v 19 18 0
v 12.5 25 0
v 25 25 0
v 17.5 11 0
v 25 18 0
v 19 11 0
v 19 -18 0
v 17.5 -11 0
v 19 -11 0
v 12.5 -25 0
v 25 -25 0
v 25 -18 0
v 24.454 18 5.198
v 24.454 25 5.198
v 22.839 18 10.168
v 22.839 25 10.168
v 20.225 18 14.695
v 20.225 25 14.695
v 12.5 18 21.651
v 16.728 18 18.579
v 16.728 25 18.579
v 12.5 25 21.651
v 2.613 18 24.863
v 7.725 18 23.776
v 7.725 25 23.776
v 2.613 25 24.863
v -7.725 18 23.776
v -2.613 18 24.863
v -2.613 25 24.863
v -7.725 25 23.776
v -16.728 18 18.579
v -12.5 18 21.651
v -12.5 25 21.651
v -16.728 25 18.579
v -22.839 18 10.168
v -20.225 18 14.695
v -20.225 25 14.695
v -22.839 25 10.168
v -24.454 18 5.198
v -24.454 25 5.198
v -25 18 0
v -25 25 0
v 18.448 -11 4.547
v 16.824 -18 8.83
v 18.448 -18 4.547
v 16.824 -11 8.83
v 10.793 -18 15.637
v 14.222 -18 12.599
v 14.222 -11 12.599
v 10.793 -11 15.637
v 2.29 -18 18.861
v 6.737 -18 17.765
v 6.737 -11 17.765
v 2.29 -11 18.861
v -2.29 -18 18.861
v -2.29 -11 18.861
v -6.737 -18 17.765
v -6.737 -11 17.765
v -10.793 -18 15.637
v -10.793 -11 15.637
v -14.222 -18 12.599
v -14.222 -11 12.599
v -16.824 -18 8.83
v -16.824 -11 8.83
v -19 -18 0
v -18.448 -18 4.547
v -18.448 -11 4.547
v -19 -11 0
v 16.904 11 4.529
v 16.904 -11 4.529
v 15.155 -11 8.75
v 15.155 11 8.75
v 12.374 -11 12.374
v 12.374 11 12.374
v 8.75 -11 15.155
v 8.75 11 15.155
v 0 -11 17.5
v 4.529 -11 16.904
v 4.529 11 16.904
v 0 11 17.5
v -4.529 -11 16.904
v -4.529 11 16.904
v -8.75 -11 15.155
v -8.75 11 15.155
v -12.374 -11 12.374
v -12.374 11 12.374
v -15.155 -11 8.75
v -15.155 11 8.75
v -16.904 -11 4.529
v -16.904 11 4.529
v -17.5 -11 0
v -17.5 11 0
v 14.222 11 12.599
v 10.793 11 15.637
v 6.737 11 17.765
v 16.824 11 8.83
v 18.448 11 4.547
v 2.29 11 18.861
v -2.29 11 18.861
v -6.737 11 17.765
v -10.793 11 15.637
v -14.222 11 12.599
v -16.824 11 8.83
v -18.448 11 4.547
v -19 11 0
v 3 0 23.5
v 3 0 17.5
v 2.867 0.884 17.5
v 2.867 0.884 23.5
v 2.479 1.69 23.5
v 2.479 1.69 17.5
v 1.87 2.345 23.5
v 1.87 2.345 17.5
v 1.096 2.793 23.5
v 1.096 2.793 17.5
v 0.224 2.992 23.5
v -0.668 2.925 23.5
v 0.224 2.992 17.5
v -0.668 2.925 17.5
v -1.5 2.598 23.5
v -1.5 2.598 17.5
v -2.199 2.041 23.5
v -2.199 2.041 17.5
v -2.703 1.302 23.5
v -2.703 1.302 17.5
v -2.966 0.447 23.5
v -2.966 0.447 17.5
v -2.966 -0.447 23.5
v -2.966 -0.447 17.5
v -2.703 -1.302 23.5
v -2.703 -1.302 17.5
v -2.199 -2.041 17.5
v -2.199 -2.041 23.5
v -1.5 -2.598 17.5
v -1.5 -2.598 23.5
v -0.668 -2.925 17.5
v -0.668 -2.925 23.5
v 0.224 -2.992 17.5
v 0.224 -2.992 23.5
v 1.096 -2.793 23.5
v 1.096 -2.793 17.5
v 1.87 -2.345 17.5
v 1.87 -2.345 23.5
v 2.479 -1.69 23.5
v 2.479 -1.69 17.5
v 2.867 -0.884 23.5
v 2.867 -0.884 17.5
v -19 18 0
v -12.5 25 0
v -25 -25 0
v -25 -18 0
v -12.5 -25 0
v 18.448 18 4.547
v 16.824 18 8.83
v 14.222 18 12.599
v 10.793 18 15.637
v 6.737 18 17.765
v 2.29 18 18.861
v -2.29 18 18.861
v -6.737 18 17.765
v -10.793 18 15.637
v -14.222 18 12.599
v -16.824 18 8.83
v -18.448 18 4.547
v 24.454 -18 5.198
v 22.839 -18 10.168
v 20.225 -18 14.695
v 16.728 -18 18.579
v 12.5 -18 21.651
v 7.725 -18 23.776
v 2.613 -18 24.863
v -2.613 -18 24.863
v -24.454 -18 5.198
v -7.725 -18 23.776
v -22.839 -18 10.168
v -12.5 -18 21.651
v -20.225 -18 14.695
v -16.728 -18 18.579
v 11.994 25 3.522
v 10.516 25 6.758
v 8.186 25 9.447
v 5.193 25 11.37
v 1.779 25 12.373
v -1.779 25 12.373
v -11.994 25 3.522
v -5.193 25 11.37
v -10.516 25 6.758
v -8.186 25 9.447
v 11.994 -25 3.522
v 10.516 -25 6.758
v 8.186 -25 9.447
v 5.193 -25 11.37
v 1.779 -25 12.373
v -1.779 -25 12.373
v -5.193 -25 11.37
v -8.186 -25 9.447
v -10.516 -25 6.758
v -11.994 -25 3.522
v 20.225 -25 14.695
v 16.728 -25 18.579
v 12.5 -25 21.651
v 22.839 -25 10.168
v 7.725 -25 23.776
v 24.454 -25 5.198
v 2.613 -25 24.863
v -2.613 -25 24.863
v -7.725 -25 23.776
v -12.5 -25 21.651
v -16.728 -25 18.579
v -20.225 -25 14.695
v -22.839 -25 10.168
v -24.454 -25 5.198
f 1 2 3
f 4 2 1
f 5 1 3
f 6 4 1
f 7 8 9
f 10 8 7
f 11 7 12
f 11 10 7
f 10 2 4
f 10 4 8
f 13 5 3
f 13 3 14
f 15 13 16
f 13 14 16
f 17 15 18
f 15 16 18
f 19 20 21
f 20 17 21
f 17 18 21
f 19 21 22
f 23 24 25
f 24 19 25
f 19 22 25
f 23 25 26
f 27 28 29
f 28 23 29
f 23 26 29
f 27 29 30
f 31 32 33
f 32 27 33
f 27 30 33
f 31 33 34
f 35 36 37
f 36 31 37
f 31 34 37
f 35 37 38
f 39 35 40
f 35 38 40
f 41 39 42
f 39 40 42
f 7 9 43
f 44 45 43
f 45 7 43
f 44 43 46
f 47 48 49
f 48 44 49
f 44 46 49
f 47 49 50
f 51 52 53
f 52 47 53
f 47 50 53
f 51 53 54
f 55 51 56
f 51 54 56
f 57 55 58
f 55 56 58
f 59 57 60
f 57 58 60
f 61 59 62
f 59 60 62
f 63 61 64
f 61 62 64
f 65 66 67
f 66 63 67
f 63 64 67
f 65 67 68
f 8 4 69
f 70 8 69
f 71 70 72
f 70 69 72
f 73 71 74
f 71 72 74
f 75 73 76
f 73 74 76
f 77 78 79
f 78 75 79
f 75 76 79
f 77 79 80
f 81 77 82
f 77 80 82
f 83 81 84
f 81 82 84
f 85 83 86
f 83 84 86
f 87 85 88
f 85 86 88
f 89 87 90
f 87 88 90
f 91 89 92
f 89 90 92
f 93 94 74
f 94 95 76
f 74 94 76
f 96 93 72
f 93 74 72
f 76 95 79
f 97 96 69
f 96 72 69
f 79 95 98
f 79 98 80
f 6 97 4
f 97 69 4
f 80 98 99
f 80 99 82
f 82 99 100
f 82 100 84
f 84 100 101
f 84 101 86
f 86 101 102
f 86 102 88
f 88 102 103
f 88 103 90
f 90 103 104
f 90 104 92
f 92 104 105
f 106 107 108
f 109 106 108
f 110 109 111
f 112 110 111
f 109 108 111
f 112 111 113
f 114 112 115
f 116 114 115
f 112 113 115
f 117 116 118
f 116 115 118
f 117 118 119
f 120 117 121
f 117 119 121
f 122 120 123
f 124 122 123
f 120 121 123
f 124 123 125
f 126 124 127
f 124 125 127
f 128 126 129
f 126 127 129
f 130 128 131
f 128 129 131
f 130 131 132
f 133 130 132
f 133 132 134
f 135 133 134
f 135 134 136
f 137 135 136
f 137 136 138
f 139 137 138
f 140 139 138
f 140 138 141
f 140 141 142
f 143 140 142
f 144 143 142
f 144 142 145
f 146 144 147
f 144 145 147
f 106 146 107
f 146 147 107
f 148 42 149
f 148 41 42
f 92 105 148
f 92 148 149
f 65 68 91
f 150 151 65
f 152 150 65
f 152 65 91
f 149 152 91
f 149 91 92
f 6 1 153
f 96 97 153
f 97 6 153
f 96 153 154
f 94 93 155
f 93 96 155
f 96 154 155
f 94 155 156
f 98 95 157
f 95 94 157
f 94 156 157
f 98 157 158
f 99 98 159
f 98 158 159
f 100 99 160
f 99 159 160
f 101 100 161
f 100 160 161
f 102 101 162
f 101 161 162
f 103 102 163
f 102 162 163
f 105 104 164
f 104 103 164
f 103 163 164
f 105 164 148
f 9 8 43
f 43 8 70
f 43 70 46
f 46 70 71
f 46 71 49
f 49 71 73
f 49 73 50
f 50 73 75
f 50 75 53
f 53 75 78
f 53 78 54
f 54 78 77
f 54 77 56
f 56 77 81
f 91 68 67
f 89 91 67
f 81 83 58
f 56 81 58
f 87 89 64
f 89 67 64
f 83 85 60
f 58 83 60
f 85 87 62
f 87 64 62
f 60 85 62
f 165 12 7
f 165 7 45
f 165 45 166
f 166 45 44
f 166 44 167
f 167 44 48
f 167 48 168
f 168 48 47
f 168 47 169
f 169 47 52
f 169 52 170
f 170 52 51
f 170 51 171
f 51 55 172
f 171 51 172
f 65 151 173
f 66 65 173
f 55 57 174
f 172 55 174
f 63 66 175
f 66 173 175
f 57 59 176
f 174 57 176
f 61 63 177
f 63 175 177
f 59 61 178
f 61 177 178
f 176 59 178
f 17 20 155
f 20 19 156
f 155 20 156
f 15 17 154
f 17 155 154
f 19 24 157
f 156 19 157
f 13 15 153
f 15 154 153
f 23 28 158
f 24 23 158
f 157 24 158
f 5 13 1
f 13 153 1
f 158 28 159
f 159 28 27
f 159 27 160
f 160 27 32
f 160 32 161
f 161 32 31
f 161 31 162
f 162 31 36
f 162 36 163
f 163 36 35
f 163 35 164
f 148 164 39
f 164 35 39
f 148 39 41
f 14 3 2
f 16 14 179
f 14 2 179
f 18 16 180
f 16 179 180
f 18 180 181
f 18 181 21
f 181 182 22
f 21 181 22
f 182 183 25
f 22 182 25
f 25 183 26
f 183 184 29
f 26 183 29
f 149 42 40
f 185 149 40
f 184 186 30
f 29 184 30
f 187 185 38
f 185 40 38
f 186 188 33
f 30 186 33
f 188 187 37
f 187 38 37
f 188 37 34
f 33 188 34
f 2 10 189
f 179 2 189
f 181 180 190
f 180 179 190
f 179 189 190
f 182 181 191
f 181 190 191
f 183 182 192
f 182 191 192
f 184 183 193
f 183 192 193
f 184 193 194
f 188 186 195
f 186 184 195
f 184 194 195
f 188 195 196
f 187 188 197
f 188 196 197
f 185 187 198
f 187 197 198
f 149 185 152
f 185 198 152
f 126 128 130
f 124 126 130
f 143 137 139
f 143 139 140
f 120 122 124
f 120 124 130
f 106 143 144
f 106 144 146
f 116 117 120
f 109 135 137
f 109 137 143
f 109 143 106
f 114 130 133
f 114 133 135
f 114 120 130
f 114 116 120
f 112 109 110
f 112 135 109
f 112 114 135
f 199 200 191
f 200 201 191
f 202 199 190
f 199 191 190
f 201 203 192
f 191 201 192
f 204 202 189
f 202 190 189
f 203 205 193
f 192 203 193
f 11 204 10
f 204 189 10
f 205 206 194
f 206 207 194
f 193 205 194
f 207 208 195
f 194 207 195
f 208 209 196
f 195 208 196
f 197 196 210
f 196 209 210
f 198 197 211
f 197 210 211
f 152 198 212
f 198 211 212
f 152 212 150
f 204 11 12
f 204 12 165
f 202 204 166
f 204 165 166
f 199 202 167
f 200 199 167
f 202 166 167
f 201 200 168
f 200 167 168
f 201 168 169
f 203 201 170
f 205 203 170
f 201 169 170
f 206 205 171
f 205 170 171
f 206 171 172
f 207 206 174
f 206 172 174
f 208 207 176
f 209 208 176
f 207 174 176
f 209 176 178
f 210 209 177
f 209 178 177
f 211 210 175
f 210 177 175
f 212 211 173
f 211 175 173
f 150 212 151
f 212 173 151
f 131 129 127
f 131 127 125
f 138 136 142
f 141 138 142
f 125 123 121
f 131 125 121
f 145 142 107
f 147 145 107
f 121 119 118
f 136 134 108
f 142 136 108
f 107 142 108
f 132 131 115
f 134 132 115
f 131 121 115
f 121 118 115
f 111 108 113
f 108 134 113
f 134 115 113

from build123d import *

# Parameters (mm, degrees)
CUT_EXTRUDE2_DEPTH      = 62.23724357
CUT_EXTRUDE2_DEPTH_BACK = 62.23724357
SKETCH4_R               = 3
BOSS_EXTRUDE1_DEPTH     = 6


with BuildPart() as part:
    # Sketch1 → Revolve1 (revolve)
    with BuildSketch(Plane.XY, mode=Mode.PRIVATE) as revolve1_sk:
        Polygon((12.5, 25), (12.5, -25), (25, -25), (25, -18), (19, -18), (19, -11), (17.5, -11), (17.5, 11), (19, 11), (19, 18), (25, 18), (25, 25), align=None)
    revolve(revolve1_sk.sketch.rotate(Axis((0, 26.261829653, 0), (0, -1, 0)), 90), axis=Axis((0, 26.261829653, 0), (0, -1, 0)))

    # Sketch2 → Cut-Extrude2 (cut, two sides: drawn at the far end of the back side and taken through both)
    with BuildSketch(Plane(origin=(0, 25, 0), x_dir=(1, 0, 0), z_dir=(0, 1, 0)).offset(-CUT_EXTRUDE2_DEPTH_BACK)):
        Polygon((-146.803398875, 0), (-25, 0), (25, 0), (146.803398875, 0), (146.803398875, 243.60679775), (-146.803398875, 243.60679775), align=None)
    extrude(amount=CUT_EXTRUDE2_DEPTH + CUT_EXTRUDE2_DEPTH_BACK, mode=Mode.SUBTRACT)


with BuildPart() as body_2:
    # Sketch4 → Boss-Extrude1 (new body)
    with BuildSketch(Plane.XY.offset(17.5)):
        Circle(SKETCH4_R)
    extrude(amount=BOSS_EXTRUDE1_DEPTH)


solid = Compound([part.part, body_2.part])
